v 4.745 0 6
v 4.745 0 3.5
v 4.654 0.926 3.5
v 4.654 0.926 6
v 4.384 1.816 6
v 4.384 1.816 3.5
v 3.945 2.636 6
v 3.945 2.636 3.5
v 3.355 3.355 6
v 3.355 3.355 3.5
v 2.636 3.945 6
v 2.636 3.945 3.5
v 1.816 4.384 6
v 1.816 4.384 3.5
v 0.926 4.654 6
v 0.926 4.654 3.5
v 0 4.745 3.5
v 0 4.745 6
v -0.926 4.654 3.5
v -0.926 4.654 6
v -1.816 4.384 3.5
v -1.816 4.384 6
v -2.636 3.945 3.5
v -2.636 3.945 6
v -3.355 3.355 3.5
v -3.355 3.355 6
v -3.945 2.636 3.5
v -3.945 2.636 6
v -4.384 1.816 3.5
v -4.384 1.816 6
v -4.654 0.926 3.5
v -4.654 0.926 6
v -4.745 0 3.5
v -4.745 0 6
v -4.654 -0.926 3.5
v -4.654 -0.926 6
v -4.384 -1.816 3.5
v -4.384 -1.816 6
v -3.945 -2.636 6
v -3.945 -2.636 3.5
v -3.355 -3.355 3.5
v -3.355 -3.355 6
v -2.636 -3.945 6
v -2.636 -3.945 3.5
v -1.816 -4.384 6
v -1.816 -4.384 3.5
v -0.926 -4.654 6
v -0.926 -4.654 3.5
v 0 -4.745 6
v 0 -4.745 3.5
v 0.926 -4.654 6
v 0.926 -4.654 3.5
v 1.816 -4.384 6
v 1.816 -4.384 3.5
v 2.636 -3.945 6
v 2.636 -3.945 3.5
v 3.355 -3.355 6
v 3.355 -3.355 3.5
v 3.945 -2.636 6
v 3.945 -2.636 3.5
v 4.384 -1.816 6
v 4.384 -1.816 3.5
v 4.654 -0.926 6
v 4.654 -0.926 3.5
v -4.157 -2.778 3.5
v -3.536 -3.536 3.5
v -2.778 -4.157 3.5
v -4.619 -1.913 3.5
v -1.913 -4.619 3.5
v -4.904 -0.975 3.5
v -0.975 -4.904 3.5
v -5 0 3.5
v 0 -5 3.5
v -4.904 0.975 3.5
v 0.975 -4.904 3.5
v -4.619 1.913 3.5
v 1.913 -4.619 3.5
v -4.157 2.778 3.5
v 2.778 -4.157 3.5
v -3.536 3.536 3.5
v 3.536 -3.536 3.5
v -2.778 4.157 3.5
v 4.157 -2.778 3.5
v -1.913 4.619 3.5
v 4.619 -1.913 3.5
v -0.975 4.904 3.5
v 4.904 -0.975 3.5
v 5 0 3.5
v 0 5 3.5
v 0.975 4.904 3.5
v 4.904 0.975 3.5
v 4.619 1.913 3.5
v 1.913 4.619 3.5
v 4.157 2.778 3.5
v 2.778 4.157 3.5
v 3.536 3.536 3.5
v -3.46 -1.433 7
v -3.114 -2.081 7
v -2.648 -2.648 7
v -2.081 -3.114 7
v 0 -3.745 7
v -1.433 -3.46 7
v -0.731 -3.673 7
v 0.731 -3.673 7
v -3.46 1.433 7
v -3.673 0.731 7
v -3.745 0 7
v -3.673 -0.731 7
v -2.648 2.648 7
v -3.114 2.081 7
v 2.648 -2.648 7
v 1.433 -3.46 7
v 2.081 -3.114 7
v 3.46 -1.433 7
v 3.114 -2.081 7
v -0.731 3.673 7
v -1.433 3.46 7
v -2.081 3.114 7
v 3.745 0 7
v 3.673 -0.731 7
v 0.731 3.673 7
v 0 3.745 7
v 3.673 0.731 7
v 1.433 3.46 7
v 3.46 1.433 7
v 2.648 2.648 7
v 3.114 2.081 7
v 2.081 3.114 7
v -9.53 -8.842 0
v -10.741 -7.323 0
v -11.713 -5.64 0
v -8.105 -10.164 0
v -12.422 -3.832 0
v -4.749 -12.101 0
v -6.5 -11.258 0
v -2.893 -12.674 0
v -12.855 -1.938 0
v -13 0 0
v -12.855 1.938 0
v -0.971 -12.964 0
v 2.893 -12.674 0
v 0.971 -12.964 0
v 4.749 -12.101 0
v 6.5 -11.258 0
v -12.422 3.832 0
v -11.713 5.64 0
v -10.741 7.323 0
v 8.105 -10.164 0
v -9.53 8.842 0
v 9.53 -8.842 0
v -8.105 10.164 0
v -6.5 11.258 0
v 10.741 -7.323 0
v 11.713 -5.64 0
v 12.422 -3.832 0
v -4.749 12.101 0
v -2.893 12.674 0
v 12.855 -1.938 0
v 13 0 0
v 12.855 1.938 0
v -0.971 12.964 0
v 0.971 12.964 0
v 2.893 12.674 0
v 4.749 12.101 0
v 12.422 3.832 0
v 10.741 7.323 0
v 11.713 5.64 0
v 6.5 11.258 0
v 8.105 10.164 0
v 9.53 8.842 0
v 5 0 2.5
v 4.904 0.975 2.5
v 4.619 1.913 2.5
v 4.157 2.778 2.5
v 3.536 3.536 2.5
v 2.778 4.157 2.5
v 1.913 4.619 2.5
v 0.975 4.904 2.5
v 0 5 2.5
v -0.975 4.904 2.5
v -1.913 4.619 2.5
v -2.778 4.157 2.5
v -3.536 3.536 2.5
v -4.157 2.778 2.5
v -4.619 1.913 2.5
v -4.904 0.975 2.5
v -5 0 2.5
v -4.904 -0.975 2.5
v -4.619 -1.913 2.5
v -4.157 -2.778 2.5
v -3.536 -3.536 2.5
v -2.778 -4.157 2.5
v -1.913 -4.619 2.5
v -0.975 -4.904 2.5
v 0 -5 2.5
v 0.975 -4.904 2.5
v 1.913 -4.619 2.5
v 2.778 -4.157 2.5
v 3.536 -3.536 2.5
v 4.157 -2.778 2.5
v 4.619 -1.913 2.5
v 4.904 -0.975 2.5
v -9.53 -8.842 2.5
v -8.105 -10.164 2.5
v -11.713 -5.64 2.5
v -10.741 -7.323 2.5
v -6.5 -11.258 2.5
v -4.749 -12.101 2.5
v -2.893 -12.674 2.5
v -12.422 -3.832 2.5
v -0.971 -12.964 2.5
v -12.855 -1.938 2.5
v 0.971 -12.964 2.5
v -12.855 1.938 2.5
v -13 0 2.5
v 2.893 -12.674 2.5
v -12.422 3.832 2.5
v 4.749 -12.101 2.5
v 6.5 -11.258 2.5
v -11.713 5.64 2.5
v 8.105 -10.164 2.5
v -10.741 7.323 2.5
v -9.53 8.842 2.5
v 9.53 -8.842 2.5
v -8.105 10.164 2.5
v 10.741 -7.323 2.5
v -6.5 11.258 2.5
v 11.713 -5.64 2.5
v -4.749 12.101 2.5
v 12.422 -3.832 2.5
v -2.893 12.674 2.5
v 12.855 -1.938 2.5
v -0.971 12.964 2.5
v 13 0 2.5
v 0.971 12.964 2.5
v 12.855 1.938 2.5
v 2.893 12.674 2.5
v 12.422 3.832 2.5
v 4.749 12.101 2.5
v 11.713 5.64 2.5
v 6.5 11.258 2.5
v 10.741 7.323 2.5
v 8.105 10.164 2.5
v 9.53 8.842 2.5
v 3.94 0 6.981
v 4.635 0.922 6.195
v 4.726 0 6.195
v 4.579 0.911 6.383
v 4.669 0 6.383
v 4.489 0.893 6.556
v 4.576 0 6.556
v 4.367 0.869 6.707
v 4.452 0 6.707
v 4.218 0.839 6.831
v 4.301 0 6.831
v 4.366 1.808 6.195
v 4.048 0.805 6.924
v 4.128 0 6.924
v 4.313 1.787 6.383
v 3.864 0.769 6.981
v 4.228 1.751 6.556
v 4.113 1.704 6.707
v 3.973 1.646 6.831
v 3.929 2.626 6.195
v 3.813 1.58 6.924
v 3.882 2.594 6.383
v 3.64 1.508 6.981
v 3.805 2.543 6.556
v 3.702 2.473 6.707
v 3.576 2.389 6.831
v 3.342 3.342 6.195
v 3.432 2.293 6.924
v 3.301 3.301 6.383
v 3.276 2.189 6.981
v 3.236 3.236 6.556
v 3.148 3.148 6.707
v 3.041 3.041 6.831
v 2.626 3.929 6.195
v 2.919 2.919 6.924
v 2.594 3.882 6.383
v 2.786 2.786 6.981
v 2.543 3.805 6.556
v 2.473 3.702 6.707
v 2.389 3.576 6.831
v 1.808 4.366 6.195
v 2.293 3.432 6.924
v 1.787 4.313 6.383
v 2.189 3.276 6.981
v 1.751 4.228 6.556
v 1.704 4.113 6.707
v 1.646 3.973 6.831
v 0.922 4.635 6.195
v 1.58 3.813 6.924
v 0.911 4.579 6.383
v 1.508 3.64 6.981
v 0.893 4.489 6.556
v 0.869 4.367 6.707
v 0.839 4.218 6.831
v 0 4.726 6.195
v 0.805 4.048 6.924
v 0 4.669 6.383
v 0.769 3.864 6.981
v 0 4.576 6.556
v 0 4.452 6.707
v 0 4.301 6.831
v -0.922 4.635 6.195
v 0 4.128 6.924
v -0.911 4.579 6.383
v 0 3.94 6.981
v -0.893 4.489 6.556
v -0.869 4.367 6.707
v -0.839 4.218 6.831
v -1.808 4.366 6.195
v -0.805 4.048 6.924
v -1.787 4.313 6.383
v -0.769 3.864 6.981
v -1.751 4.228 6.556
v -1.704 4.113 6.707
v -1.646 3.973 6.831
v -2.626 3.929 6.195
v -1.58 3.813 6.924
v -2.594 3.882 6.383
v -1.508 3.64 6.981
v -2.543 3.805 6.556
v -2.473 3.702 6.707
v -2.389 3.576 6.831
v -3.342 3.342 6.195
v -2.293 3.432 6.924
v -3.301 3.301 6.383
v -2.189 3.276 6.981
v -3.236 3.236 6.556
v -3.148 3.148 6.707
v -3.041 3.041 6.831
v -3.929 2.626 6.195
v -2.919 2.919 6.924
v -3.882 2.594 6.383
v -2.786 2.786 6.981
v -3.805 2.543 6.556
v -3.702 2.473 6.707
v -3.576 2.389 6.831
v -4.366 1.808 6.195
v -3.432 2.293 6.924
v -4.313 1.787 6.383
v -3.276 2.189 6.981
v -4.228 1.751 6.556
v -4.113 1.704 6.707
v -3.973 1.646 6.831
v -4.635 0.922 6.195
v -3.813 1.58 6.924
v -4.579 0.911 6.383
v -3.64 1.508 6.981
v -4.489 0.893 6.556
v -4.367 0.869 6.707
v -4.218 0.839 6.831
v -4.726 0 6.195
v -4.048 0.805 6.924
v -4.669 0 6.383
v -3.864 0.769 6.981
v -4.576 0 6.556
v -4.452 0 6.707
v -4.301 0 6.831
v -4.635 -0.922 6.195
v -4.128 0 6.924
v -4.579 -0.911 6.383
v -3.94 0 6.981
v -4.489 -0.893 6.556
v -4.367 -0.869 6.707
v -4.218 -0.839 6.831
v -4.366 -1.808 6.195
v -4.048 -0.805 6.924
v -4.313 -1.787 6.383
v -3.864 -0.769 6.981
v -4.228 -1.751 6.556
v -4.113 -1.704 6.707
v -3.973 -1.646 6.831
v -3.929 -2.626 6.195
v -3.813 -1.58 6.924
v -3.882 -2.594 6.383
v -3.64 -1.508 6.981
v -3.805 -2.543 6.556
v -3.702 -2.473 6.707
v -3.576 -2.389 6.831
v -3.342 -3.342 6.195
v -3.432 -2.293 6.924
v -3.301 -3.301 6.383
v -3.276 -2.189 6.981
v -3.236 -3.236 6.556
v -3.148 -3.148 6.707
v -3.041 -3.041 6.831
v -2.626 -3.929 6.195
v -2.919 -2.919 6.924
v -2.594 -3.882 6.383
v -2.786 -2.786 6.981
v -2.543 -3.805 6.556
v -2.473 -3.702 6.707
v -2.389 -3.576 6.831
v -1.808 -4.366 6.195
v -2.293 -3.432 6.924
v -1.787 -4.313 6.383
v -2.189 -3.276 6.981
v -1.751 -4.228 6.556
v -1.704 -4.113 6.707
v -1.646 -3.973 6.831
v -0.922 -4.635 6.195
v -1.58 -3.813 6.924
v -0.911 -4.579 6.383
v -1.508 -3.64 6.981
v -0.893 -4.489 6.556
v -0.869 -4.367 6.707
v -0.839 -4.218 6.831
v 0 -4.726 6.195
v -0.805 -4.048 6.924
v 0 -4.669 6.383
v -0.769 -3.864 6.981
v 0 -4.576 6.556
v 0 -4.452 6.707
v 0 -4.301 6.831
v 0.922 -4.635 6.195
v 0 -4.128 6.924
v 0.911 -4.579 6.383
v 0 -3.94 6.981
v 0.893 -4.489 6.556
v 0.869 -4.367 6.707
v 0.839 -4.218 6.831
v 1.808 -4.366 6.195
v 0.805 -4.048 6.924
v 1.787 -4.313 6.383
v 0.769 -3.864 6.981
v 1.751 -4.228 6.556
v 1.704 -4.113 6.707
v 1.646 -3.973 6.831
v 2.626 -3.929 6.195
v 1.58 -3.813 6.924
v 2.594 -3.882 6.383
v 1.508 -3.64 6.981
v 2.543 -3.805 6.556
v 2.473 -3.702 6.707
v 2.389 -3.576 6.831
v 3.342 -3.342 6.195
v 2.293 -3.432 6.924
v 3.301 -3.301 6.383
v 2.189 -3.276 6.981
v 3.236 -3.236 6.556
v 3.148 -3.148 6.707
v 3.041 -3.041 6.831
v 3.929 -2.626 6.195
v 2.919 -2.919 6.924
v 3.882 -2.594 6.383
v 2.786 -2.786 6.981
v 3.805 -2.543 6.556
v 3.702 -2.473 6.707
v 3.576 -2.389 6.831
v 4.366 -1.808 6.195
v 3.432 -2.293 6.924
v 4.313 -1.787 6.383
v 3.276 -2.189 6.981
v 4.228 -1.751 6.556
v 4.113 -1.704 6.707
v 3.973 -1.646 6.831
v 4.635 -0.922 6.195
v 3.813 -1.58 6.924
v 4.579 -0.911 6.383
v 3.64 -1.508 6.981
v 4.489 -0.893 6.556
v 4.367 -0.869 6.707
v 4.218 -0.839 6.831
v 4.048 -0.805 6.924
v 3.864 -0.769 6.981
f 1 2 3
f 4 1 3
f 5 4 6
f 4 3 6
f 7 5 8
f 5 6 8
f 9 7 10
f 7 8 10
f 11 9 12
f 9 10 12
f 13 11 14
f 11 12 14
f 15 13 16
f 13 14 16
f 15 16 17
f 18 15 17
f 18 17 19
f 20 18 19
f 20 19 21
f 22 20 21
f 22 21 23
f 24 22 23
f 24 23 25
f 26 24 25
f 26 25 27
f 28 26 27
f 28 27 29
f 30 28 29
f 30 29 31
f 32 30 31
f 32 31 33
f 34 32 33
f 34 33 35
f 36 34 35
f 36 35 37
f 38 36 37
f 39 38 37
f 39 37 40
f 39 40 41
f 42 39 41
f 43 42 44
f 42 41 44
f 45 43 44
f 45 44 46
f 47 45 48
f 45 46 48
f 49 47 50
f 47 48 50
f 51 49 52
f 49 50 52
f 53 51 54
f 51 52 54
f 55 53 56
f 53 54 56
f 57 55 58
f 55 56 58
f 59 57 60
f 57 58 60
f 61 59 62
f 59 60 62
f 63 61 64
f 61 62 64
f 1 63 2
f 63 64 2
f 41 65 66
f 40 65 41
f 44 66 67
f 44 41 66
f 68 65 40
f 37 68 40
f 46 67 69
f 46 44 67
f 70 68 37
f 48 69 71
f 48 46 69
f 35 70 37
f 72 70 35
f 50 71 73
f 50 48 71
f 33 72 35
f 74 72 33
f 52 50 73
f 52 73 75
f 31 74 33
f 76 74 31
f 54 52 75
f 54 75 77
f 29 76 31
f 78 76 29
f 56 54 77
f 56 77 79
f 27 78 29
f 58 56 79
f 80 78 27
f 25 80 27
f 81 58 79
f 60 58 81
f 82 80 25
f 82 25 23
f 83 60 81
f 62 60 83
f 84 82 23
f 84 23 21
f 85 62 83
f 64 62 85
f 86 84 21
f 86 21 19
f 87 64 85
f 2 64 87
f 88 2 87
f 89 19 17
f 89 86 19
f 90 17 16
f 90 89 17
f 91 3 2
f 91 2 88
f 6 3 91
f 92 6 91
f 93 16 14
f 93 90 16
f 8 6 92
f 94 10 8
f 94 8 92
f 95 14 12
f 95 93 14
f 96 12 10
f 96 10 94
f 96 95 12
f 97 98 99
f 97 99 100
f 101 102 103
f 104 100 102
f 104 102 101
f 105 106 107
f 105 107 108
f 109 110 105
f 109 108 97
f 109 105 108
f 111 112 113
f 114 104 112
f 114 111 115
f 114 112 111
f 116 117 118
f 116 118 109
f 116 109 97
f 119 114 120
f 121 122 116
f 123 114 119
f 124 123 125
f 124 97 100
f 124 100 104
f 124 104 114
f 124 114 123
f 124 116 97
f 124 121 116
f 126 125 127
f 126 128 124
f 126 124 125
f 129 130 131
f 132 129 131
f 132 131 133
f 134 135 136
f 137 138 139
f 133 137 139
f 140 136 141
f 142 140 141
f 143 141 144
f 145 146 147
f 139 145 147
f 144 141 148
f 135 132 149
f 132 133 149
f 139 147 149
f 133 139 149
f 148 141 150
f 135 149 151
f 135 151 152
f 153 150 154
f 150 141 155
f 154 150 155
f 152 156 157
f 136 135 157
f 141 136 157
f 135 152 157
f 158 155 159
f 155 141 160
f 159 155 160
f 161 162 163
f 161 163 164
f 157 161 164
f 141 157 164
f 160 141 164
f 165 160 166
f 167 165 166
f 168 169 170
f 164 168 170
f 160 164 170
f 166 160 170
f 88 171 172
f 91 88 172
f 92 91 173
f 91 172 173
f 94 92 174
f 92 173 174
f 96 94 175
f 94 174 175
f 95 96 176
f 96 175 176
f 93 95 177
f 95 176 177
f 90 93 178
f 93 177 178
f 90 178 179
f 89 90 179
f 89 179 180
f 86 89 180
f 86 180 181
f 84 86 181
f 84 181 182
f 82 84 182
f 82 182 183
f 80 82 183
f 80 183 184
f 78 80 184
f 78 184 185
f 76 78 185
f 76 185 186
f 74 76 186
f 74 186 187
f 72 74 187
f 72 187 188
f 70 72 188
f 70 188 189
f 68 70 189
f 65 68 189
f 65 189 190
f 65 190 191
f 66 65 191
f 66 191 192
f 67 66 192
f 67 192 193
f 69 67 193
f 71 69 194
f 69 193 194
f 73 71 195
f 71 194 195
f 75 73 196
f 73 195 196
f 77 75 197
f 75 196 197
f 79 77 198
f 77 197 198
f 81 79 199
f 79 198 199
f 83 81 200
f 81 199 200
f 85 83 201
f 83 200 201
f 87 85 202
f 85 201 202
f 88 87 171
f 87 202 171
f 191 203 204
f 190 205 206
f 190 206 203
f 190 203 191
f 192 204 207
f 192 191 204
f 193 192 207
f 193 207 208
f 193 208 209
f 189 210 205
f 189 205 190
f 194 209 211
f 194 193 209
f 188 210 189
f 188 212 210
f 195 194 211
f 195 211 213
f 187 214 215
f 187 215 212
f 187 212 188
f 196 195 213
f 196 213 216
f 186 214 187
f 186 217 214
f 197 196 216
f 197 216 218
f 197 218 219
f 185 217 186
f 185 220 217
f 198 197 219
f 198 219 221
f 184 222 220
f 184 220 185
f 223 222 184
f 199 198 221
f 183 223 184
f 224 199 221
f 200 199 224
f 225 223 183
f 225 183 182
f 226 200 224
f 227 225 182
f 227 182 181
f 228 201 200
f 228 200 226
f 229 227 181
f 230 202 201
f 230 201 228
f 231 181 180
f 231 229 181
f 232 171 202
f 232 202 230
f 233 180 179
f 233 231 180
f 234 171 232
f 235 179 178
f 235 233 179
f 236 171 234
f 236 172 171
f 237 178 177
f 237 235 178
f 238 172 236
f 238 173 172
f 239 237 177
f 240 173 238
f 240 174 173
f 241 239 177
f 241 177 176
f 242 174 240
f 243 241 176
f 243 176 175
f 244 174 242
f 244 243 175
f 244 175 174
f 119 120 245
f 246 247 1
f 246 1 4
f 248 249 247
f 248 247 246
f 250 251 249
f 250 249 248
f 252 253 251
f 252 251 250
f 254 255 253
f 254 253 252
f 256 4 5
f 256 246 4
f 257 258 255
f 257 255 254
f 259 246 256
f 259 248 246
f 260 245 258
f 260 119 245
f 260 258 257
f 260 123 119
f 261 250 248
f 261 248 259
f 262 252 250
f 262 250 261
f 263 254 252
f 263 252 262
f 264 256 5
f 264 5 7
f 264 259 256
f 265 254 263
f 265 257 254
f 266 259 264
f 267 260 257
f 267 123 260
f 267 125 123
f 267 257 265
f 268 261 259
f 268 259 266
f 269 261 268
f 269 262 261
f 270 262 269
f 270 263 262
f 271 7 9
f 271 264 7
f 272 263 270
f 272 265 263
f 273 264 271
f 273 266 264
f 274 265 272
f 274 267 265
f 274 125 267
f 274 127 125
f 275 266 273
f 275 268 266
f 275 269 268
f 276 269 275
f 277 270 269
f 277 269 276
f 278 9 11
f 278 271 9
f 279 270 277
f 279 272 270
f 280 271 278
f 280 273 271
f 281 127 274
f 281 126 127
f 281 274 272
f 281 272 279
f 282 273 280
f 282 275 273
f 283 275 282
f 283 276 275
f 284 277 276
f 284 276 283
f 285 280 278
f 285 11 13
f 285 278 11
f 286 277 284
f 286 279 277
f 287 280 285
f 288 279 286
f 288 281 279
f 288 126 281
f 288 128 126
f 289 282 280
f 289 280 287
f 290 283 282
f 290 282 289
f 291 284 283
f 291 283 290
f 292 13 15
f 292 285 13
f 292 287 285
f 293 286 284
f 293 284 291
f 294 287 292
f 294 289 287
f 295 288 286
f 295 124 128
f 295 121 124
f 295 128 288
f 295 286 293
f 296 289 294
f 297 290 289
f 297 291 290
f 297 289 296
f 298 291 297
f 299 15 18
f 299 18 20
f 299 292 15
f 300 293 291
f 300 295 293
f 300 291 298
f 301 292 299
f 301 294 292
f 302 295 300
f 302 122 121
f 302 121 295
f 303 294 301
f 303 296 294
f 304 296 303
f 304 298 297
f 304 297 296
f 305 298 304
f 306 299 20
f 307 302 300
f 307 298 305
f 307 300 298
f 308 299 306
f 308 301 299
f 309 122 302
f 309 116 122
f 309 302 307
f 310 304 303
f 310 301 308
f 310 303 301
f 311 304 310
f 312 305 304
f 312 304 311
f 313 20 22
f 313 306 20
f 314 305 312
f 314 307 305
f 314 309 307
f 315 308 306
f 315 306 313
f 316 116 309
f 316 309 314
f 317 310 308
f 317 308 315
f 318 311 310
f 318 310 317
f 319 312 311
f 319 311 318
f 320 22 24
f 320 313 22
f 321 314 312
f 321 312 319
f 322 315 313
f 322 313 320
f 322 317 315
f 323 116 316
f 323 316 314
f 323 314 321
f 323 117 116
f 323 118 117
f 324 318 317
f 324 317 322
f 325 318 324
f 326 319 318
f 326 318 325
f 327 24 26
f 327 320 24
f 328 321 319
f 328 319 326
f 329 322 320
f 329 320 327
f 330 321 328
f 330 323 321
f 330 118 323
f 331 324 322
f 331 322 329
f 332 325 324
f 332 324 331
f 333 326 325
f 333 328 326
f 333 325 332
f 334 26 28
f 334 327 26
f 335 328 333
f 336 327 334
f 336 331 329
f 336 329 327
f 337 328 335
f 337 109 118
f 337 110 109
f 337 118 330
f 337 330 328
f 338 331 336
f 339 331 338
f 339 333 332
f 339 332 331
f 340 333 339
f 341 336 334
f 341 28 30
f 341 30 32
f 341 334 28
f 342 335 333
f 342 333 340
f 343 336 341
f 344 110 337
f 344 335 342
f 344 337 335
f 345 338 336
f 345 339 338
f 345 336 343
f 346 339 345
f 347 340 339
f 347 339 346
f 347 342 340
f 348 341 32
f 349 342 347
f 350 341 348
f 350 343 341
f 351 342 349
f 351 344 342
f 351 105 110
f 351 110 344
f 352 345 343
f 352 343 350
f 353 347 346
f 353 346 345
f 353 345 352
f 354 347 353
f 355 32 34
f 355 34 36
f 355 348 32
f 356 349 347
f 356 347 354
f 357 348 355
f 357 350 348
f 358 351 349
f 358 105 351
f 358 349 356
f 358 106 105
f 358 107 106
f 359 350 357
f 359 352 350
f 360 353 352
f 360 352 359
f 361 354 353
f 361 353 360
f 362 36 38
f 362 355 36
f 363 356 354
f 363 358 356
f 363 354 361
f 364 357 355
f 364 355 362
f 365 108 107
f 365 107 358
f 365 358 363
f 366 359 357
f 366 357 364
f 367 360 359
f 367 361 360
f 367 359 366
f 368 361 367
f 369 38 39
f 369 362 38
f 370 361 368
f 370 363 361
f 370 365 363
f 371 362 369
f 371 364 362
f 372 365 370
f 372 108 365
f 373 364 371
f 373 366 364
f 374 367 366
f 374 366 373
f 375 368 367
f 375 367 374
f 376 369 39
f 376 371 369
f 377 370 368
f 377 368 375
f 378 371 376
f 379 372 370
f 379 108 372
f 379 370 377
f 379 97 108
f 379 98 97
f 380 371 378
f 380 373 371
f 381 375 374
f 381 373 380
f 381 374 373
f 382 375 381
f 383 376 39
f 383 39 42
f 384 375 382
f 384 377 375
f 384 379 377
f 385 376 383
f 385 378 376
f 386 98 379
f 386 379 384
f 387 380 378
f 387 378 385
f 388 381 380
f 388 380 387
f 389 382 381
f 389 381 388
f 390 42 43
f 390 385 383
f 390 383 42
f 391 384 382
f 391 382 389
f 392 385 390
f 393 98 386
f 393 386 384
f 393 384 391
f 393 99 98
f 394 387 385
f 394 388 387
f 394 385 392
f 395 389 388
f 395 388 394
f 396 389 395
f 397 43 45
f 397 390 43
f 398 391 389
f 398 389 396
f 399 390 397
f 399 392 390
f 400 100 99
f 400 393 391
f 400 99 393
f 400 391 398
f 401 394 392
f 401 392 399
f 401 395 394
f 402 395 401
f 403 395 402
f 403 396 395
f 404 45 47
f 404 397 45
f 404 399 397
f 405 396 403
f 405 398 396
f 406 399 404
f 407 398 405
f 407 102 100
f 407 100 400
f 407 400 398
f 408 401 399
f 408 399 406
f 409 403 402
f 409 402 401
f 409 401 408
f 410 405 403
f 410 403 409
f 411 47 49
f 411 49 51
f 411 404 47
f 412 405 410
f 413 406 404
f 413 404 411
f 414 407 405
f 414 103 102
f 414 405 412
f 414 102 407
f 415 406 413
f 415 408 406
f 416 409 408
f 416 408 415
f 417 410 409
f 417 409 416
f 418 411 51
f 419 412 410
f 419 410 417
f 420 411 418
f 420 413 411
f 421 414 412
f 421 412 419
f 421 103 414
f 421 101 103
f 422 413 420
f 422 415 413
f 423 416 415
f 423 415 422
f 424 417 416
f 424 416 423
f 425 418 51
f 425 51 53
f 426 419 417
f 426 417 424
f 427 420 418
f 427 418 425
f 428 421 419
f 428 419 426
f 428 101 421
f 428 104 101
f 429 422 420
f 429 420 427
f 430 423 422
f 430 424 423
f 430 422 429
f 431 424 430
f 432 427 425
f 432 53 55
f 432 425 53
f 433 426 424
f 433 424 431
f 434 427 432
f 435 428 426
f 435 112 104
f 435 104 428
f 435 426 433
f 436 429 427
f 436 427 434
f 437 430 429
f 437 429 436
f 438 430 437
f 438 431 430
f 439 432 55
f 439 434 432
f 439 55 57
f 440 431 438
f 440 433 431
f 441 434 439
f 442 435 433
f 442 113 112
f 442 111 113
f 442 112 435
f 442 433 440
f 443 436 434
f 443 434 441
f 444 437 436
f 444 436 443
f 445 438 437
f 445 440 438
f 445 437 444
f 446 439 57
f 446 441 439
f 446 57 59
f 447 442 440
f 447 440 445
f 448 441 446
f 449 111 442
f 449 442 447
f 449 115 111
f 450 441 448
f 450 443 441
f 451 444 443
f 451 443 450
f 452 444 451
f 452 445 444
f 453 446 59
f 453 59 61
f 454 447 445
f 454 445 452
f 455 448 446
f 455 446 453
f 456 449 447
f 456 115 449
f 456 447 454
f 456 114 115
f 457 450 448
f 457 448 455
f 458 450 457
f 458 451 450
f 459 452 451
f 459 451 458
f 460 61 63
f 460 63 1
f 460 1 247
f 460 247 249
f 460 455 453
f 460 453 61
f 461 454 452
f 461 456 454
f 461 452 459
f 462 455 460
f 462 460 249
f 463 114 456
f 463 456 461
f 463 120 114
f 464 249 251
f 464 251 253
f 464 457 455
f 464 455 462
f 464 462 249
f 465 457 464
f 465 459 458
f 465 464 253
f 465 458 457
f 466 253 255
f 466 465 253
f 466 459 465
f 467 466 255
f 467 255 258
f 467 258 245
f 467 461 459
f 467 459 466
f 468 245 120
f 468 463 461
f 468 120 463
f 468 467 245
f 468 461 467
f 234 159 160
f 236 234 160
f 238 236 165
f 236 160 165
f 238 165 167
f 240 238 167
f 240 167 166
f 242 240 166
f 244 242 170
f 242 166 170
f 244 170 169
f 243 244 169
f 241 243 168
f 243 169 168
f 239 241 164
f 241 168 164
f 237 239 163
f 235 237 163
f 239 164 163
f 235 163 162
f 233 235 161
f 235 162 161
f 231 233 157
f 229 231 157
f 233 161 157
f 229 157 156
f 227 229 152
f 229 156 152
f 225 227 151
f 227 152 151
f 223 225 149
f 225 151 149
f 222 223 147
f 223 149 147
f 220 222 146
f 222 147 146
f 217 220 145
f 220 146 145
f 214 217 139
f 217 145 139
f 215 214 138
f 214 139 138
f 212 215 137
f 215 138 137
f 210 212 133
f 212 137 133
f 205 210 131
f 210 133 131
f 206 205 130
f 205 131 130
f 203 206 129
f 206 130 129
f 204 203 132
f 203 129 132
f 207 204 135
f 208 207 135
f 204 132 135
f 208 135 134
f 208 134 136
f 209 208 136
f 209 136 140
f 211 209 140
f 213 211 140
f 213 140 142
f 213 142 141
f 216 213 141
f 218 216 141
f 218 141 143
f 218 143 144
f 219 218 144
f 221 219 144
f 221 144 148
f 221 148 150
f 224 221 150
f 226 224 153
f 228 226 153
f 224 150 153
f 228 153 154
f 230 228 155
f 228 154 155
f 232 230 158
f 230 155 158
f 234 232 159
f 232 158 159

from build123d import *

# Parameters (mm, degrees)
F0_R     = 13
F1_DEPTH = 2.5
F2_R     = 5
F3_DEPTH = 3.5
F4_R     = 4.745
F5_DEPTH = 7
F6_R     = 1


with BuildPart() as f1:
    # F0 (on Top) → F1 (new body)
    with BuildSketch(Plane.XY):
        Circle(F0_R)
    extrude(amount=F1_DEPTH)

    # F2 (on Top) → F3 (join)
    with BuildSketch(Plane.XY):
        Circle(F2_R)
    extrude(amount=F3_DEPTH)

    # F4 (on Top) → F5 (join)
    with BuildSketch(Plane.XY):
        Circle(F4_R)
    extrude(amount=F5_DEPTH)

    # F6
    f6_edges = [f1.edges().sort_by_distance(p)[0] for p in [
        (-4.745, 0, 7),
    ]]
    fillet(f6_edges, radius=F6_R)


solid = f1.part
